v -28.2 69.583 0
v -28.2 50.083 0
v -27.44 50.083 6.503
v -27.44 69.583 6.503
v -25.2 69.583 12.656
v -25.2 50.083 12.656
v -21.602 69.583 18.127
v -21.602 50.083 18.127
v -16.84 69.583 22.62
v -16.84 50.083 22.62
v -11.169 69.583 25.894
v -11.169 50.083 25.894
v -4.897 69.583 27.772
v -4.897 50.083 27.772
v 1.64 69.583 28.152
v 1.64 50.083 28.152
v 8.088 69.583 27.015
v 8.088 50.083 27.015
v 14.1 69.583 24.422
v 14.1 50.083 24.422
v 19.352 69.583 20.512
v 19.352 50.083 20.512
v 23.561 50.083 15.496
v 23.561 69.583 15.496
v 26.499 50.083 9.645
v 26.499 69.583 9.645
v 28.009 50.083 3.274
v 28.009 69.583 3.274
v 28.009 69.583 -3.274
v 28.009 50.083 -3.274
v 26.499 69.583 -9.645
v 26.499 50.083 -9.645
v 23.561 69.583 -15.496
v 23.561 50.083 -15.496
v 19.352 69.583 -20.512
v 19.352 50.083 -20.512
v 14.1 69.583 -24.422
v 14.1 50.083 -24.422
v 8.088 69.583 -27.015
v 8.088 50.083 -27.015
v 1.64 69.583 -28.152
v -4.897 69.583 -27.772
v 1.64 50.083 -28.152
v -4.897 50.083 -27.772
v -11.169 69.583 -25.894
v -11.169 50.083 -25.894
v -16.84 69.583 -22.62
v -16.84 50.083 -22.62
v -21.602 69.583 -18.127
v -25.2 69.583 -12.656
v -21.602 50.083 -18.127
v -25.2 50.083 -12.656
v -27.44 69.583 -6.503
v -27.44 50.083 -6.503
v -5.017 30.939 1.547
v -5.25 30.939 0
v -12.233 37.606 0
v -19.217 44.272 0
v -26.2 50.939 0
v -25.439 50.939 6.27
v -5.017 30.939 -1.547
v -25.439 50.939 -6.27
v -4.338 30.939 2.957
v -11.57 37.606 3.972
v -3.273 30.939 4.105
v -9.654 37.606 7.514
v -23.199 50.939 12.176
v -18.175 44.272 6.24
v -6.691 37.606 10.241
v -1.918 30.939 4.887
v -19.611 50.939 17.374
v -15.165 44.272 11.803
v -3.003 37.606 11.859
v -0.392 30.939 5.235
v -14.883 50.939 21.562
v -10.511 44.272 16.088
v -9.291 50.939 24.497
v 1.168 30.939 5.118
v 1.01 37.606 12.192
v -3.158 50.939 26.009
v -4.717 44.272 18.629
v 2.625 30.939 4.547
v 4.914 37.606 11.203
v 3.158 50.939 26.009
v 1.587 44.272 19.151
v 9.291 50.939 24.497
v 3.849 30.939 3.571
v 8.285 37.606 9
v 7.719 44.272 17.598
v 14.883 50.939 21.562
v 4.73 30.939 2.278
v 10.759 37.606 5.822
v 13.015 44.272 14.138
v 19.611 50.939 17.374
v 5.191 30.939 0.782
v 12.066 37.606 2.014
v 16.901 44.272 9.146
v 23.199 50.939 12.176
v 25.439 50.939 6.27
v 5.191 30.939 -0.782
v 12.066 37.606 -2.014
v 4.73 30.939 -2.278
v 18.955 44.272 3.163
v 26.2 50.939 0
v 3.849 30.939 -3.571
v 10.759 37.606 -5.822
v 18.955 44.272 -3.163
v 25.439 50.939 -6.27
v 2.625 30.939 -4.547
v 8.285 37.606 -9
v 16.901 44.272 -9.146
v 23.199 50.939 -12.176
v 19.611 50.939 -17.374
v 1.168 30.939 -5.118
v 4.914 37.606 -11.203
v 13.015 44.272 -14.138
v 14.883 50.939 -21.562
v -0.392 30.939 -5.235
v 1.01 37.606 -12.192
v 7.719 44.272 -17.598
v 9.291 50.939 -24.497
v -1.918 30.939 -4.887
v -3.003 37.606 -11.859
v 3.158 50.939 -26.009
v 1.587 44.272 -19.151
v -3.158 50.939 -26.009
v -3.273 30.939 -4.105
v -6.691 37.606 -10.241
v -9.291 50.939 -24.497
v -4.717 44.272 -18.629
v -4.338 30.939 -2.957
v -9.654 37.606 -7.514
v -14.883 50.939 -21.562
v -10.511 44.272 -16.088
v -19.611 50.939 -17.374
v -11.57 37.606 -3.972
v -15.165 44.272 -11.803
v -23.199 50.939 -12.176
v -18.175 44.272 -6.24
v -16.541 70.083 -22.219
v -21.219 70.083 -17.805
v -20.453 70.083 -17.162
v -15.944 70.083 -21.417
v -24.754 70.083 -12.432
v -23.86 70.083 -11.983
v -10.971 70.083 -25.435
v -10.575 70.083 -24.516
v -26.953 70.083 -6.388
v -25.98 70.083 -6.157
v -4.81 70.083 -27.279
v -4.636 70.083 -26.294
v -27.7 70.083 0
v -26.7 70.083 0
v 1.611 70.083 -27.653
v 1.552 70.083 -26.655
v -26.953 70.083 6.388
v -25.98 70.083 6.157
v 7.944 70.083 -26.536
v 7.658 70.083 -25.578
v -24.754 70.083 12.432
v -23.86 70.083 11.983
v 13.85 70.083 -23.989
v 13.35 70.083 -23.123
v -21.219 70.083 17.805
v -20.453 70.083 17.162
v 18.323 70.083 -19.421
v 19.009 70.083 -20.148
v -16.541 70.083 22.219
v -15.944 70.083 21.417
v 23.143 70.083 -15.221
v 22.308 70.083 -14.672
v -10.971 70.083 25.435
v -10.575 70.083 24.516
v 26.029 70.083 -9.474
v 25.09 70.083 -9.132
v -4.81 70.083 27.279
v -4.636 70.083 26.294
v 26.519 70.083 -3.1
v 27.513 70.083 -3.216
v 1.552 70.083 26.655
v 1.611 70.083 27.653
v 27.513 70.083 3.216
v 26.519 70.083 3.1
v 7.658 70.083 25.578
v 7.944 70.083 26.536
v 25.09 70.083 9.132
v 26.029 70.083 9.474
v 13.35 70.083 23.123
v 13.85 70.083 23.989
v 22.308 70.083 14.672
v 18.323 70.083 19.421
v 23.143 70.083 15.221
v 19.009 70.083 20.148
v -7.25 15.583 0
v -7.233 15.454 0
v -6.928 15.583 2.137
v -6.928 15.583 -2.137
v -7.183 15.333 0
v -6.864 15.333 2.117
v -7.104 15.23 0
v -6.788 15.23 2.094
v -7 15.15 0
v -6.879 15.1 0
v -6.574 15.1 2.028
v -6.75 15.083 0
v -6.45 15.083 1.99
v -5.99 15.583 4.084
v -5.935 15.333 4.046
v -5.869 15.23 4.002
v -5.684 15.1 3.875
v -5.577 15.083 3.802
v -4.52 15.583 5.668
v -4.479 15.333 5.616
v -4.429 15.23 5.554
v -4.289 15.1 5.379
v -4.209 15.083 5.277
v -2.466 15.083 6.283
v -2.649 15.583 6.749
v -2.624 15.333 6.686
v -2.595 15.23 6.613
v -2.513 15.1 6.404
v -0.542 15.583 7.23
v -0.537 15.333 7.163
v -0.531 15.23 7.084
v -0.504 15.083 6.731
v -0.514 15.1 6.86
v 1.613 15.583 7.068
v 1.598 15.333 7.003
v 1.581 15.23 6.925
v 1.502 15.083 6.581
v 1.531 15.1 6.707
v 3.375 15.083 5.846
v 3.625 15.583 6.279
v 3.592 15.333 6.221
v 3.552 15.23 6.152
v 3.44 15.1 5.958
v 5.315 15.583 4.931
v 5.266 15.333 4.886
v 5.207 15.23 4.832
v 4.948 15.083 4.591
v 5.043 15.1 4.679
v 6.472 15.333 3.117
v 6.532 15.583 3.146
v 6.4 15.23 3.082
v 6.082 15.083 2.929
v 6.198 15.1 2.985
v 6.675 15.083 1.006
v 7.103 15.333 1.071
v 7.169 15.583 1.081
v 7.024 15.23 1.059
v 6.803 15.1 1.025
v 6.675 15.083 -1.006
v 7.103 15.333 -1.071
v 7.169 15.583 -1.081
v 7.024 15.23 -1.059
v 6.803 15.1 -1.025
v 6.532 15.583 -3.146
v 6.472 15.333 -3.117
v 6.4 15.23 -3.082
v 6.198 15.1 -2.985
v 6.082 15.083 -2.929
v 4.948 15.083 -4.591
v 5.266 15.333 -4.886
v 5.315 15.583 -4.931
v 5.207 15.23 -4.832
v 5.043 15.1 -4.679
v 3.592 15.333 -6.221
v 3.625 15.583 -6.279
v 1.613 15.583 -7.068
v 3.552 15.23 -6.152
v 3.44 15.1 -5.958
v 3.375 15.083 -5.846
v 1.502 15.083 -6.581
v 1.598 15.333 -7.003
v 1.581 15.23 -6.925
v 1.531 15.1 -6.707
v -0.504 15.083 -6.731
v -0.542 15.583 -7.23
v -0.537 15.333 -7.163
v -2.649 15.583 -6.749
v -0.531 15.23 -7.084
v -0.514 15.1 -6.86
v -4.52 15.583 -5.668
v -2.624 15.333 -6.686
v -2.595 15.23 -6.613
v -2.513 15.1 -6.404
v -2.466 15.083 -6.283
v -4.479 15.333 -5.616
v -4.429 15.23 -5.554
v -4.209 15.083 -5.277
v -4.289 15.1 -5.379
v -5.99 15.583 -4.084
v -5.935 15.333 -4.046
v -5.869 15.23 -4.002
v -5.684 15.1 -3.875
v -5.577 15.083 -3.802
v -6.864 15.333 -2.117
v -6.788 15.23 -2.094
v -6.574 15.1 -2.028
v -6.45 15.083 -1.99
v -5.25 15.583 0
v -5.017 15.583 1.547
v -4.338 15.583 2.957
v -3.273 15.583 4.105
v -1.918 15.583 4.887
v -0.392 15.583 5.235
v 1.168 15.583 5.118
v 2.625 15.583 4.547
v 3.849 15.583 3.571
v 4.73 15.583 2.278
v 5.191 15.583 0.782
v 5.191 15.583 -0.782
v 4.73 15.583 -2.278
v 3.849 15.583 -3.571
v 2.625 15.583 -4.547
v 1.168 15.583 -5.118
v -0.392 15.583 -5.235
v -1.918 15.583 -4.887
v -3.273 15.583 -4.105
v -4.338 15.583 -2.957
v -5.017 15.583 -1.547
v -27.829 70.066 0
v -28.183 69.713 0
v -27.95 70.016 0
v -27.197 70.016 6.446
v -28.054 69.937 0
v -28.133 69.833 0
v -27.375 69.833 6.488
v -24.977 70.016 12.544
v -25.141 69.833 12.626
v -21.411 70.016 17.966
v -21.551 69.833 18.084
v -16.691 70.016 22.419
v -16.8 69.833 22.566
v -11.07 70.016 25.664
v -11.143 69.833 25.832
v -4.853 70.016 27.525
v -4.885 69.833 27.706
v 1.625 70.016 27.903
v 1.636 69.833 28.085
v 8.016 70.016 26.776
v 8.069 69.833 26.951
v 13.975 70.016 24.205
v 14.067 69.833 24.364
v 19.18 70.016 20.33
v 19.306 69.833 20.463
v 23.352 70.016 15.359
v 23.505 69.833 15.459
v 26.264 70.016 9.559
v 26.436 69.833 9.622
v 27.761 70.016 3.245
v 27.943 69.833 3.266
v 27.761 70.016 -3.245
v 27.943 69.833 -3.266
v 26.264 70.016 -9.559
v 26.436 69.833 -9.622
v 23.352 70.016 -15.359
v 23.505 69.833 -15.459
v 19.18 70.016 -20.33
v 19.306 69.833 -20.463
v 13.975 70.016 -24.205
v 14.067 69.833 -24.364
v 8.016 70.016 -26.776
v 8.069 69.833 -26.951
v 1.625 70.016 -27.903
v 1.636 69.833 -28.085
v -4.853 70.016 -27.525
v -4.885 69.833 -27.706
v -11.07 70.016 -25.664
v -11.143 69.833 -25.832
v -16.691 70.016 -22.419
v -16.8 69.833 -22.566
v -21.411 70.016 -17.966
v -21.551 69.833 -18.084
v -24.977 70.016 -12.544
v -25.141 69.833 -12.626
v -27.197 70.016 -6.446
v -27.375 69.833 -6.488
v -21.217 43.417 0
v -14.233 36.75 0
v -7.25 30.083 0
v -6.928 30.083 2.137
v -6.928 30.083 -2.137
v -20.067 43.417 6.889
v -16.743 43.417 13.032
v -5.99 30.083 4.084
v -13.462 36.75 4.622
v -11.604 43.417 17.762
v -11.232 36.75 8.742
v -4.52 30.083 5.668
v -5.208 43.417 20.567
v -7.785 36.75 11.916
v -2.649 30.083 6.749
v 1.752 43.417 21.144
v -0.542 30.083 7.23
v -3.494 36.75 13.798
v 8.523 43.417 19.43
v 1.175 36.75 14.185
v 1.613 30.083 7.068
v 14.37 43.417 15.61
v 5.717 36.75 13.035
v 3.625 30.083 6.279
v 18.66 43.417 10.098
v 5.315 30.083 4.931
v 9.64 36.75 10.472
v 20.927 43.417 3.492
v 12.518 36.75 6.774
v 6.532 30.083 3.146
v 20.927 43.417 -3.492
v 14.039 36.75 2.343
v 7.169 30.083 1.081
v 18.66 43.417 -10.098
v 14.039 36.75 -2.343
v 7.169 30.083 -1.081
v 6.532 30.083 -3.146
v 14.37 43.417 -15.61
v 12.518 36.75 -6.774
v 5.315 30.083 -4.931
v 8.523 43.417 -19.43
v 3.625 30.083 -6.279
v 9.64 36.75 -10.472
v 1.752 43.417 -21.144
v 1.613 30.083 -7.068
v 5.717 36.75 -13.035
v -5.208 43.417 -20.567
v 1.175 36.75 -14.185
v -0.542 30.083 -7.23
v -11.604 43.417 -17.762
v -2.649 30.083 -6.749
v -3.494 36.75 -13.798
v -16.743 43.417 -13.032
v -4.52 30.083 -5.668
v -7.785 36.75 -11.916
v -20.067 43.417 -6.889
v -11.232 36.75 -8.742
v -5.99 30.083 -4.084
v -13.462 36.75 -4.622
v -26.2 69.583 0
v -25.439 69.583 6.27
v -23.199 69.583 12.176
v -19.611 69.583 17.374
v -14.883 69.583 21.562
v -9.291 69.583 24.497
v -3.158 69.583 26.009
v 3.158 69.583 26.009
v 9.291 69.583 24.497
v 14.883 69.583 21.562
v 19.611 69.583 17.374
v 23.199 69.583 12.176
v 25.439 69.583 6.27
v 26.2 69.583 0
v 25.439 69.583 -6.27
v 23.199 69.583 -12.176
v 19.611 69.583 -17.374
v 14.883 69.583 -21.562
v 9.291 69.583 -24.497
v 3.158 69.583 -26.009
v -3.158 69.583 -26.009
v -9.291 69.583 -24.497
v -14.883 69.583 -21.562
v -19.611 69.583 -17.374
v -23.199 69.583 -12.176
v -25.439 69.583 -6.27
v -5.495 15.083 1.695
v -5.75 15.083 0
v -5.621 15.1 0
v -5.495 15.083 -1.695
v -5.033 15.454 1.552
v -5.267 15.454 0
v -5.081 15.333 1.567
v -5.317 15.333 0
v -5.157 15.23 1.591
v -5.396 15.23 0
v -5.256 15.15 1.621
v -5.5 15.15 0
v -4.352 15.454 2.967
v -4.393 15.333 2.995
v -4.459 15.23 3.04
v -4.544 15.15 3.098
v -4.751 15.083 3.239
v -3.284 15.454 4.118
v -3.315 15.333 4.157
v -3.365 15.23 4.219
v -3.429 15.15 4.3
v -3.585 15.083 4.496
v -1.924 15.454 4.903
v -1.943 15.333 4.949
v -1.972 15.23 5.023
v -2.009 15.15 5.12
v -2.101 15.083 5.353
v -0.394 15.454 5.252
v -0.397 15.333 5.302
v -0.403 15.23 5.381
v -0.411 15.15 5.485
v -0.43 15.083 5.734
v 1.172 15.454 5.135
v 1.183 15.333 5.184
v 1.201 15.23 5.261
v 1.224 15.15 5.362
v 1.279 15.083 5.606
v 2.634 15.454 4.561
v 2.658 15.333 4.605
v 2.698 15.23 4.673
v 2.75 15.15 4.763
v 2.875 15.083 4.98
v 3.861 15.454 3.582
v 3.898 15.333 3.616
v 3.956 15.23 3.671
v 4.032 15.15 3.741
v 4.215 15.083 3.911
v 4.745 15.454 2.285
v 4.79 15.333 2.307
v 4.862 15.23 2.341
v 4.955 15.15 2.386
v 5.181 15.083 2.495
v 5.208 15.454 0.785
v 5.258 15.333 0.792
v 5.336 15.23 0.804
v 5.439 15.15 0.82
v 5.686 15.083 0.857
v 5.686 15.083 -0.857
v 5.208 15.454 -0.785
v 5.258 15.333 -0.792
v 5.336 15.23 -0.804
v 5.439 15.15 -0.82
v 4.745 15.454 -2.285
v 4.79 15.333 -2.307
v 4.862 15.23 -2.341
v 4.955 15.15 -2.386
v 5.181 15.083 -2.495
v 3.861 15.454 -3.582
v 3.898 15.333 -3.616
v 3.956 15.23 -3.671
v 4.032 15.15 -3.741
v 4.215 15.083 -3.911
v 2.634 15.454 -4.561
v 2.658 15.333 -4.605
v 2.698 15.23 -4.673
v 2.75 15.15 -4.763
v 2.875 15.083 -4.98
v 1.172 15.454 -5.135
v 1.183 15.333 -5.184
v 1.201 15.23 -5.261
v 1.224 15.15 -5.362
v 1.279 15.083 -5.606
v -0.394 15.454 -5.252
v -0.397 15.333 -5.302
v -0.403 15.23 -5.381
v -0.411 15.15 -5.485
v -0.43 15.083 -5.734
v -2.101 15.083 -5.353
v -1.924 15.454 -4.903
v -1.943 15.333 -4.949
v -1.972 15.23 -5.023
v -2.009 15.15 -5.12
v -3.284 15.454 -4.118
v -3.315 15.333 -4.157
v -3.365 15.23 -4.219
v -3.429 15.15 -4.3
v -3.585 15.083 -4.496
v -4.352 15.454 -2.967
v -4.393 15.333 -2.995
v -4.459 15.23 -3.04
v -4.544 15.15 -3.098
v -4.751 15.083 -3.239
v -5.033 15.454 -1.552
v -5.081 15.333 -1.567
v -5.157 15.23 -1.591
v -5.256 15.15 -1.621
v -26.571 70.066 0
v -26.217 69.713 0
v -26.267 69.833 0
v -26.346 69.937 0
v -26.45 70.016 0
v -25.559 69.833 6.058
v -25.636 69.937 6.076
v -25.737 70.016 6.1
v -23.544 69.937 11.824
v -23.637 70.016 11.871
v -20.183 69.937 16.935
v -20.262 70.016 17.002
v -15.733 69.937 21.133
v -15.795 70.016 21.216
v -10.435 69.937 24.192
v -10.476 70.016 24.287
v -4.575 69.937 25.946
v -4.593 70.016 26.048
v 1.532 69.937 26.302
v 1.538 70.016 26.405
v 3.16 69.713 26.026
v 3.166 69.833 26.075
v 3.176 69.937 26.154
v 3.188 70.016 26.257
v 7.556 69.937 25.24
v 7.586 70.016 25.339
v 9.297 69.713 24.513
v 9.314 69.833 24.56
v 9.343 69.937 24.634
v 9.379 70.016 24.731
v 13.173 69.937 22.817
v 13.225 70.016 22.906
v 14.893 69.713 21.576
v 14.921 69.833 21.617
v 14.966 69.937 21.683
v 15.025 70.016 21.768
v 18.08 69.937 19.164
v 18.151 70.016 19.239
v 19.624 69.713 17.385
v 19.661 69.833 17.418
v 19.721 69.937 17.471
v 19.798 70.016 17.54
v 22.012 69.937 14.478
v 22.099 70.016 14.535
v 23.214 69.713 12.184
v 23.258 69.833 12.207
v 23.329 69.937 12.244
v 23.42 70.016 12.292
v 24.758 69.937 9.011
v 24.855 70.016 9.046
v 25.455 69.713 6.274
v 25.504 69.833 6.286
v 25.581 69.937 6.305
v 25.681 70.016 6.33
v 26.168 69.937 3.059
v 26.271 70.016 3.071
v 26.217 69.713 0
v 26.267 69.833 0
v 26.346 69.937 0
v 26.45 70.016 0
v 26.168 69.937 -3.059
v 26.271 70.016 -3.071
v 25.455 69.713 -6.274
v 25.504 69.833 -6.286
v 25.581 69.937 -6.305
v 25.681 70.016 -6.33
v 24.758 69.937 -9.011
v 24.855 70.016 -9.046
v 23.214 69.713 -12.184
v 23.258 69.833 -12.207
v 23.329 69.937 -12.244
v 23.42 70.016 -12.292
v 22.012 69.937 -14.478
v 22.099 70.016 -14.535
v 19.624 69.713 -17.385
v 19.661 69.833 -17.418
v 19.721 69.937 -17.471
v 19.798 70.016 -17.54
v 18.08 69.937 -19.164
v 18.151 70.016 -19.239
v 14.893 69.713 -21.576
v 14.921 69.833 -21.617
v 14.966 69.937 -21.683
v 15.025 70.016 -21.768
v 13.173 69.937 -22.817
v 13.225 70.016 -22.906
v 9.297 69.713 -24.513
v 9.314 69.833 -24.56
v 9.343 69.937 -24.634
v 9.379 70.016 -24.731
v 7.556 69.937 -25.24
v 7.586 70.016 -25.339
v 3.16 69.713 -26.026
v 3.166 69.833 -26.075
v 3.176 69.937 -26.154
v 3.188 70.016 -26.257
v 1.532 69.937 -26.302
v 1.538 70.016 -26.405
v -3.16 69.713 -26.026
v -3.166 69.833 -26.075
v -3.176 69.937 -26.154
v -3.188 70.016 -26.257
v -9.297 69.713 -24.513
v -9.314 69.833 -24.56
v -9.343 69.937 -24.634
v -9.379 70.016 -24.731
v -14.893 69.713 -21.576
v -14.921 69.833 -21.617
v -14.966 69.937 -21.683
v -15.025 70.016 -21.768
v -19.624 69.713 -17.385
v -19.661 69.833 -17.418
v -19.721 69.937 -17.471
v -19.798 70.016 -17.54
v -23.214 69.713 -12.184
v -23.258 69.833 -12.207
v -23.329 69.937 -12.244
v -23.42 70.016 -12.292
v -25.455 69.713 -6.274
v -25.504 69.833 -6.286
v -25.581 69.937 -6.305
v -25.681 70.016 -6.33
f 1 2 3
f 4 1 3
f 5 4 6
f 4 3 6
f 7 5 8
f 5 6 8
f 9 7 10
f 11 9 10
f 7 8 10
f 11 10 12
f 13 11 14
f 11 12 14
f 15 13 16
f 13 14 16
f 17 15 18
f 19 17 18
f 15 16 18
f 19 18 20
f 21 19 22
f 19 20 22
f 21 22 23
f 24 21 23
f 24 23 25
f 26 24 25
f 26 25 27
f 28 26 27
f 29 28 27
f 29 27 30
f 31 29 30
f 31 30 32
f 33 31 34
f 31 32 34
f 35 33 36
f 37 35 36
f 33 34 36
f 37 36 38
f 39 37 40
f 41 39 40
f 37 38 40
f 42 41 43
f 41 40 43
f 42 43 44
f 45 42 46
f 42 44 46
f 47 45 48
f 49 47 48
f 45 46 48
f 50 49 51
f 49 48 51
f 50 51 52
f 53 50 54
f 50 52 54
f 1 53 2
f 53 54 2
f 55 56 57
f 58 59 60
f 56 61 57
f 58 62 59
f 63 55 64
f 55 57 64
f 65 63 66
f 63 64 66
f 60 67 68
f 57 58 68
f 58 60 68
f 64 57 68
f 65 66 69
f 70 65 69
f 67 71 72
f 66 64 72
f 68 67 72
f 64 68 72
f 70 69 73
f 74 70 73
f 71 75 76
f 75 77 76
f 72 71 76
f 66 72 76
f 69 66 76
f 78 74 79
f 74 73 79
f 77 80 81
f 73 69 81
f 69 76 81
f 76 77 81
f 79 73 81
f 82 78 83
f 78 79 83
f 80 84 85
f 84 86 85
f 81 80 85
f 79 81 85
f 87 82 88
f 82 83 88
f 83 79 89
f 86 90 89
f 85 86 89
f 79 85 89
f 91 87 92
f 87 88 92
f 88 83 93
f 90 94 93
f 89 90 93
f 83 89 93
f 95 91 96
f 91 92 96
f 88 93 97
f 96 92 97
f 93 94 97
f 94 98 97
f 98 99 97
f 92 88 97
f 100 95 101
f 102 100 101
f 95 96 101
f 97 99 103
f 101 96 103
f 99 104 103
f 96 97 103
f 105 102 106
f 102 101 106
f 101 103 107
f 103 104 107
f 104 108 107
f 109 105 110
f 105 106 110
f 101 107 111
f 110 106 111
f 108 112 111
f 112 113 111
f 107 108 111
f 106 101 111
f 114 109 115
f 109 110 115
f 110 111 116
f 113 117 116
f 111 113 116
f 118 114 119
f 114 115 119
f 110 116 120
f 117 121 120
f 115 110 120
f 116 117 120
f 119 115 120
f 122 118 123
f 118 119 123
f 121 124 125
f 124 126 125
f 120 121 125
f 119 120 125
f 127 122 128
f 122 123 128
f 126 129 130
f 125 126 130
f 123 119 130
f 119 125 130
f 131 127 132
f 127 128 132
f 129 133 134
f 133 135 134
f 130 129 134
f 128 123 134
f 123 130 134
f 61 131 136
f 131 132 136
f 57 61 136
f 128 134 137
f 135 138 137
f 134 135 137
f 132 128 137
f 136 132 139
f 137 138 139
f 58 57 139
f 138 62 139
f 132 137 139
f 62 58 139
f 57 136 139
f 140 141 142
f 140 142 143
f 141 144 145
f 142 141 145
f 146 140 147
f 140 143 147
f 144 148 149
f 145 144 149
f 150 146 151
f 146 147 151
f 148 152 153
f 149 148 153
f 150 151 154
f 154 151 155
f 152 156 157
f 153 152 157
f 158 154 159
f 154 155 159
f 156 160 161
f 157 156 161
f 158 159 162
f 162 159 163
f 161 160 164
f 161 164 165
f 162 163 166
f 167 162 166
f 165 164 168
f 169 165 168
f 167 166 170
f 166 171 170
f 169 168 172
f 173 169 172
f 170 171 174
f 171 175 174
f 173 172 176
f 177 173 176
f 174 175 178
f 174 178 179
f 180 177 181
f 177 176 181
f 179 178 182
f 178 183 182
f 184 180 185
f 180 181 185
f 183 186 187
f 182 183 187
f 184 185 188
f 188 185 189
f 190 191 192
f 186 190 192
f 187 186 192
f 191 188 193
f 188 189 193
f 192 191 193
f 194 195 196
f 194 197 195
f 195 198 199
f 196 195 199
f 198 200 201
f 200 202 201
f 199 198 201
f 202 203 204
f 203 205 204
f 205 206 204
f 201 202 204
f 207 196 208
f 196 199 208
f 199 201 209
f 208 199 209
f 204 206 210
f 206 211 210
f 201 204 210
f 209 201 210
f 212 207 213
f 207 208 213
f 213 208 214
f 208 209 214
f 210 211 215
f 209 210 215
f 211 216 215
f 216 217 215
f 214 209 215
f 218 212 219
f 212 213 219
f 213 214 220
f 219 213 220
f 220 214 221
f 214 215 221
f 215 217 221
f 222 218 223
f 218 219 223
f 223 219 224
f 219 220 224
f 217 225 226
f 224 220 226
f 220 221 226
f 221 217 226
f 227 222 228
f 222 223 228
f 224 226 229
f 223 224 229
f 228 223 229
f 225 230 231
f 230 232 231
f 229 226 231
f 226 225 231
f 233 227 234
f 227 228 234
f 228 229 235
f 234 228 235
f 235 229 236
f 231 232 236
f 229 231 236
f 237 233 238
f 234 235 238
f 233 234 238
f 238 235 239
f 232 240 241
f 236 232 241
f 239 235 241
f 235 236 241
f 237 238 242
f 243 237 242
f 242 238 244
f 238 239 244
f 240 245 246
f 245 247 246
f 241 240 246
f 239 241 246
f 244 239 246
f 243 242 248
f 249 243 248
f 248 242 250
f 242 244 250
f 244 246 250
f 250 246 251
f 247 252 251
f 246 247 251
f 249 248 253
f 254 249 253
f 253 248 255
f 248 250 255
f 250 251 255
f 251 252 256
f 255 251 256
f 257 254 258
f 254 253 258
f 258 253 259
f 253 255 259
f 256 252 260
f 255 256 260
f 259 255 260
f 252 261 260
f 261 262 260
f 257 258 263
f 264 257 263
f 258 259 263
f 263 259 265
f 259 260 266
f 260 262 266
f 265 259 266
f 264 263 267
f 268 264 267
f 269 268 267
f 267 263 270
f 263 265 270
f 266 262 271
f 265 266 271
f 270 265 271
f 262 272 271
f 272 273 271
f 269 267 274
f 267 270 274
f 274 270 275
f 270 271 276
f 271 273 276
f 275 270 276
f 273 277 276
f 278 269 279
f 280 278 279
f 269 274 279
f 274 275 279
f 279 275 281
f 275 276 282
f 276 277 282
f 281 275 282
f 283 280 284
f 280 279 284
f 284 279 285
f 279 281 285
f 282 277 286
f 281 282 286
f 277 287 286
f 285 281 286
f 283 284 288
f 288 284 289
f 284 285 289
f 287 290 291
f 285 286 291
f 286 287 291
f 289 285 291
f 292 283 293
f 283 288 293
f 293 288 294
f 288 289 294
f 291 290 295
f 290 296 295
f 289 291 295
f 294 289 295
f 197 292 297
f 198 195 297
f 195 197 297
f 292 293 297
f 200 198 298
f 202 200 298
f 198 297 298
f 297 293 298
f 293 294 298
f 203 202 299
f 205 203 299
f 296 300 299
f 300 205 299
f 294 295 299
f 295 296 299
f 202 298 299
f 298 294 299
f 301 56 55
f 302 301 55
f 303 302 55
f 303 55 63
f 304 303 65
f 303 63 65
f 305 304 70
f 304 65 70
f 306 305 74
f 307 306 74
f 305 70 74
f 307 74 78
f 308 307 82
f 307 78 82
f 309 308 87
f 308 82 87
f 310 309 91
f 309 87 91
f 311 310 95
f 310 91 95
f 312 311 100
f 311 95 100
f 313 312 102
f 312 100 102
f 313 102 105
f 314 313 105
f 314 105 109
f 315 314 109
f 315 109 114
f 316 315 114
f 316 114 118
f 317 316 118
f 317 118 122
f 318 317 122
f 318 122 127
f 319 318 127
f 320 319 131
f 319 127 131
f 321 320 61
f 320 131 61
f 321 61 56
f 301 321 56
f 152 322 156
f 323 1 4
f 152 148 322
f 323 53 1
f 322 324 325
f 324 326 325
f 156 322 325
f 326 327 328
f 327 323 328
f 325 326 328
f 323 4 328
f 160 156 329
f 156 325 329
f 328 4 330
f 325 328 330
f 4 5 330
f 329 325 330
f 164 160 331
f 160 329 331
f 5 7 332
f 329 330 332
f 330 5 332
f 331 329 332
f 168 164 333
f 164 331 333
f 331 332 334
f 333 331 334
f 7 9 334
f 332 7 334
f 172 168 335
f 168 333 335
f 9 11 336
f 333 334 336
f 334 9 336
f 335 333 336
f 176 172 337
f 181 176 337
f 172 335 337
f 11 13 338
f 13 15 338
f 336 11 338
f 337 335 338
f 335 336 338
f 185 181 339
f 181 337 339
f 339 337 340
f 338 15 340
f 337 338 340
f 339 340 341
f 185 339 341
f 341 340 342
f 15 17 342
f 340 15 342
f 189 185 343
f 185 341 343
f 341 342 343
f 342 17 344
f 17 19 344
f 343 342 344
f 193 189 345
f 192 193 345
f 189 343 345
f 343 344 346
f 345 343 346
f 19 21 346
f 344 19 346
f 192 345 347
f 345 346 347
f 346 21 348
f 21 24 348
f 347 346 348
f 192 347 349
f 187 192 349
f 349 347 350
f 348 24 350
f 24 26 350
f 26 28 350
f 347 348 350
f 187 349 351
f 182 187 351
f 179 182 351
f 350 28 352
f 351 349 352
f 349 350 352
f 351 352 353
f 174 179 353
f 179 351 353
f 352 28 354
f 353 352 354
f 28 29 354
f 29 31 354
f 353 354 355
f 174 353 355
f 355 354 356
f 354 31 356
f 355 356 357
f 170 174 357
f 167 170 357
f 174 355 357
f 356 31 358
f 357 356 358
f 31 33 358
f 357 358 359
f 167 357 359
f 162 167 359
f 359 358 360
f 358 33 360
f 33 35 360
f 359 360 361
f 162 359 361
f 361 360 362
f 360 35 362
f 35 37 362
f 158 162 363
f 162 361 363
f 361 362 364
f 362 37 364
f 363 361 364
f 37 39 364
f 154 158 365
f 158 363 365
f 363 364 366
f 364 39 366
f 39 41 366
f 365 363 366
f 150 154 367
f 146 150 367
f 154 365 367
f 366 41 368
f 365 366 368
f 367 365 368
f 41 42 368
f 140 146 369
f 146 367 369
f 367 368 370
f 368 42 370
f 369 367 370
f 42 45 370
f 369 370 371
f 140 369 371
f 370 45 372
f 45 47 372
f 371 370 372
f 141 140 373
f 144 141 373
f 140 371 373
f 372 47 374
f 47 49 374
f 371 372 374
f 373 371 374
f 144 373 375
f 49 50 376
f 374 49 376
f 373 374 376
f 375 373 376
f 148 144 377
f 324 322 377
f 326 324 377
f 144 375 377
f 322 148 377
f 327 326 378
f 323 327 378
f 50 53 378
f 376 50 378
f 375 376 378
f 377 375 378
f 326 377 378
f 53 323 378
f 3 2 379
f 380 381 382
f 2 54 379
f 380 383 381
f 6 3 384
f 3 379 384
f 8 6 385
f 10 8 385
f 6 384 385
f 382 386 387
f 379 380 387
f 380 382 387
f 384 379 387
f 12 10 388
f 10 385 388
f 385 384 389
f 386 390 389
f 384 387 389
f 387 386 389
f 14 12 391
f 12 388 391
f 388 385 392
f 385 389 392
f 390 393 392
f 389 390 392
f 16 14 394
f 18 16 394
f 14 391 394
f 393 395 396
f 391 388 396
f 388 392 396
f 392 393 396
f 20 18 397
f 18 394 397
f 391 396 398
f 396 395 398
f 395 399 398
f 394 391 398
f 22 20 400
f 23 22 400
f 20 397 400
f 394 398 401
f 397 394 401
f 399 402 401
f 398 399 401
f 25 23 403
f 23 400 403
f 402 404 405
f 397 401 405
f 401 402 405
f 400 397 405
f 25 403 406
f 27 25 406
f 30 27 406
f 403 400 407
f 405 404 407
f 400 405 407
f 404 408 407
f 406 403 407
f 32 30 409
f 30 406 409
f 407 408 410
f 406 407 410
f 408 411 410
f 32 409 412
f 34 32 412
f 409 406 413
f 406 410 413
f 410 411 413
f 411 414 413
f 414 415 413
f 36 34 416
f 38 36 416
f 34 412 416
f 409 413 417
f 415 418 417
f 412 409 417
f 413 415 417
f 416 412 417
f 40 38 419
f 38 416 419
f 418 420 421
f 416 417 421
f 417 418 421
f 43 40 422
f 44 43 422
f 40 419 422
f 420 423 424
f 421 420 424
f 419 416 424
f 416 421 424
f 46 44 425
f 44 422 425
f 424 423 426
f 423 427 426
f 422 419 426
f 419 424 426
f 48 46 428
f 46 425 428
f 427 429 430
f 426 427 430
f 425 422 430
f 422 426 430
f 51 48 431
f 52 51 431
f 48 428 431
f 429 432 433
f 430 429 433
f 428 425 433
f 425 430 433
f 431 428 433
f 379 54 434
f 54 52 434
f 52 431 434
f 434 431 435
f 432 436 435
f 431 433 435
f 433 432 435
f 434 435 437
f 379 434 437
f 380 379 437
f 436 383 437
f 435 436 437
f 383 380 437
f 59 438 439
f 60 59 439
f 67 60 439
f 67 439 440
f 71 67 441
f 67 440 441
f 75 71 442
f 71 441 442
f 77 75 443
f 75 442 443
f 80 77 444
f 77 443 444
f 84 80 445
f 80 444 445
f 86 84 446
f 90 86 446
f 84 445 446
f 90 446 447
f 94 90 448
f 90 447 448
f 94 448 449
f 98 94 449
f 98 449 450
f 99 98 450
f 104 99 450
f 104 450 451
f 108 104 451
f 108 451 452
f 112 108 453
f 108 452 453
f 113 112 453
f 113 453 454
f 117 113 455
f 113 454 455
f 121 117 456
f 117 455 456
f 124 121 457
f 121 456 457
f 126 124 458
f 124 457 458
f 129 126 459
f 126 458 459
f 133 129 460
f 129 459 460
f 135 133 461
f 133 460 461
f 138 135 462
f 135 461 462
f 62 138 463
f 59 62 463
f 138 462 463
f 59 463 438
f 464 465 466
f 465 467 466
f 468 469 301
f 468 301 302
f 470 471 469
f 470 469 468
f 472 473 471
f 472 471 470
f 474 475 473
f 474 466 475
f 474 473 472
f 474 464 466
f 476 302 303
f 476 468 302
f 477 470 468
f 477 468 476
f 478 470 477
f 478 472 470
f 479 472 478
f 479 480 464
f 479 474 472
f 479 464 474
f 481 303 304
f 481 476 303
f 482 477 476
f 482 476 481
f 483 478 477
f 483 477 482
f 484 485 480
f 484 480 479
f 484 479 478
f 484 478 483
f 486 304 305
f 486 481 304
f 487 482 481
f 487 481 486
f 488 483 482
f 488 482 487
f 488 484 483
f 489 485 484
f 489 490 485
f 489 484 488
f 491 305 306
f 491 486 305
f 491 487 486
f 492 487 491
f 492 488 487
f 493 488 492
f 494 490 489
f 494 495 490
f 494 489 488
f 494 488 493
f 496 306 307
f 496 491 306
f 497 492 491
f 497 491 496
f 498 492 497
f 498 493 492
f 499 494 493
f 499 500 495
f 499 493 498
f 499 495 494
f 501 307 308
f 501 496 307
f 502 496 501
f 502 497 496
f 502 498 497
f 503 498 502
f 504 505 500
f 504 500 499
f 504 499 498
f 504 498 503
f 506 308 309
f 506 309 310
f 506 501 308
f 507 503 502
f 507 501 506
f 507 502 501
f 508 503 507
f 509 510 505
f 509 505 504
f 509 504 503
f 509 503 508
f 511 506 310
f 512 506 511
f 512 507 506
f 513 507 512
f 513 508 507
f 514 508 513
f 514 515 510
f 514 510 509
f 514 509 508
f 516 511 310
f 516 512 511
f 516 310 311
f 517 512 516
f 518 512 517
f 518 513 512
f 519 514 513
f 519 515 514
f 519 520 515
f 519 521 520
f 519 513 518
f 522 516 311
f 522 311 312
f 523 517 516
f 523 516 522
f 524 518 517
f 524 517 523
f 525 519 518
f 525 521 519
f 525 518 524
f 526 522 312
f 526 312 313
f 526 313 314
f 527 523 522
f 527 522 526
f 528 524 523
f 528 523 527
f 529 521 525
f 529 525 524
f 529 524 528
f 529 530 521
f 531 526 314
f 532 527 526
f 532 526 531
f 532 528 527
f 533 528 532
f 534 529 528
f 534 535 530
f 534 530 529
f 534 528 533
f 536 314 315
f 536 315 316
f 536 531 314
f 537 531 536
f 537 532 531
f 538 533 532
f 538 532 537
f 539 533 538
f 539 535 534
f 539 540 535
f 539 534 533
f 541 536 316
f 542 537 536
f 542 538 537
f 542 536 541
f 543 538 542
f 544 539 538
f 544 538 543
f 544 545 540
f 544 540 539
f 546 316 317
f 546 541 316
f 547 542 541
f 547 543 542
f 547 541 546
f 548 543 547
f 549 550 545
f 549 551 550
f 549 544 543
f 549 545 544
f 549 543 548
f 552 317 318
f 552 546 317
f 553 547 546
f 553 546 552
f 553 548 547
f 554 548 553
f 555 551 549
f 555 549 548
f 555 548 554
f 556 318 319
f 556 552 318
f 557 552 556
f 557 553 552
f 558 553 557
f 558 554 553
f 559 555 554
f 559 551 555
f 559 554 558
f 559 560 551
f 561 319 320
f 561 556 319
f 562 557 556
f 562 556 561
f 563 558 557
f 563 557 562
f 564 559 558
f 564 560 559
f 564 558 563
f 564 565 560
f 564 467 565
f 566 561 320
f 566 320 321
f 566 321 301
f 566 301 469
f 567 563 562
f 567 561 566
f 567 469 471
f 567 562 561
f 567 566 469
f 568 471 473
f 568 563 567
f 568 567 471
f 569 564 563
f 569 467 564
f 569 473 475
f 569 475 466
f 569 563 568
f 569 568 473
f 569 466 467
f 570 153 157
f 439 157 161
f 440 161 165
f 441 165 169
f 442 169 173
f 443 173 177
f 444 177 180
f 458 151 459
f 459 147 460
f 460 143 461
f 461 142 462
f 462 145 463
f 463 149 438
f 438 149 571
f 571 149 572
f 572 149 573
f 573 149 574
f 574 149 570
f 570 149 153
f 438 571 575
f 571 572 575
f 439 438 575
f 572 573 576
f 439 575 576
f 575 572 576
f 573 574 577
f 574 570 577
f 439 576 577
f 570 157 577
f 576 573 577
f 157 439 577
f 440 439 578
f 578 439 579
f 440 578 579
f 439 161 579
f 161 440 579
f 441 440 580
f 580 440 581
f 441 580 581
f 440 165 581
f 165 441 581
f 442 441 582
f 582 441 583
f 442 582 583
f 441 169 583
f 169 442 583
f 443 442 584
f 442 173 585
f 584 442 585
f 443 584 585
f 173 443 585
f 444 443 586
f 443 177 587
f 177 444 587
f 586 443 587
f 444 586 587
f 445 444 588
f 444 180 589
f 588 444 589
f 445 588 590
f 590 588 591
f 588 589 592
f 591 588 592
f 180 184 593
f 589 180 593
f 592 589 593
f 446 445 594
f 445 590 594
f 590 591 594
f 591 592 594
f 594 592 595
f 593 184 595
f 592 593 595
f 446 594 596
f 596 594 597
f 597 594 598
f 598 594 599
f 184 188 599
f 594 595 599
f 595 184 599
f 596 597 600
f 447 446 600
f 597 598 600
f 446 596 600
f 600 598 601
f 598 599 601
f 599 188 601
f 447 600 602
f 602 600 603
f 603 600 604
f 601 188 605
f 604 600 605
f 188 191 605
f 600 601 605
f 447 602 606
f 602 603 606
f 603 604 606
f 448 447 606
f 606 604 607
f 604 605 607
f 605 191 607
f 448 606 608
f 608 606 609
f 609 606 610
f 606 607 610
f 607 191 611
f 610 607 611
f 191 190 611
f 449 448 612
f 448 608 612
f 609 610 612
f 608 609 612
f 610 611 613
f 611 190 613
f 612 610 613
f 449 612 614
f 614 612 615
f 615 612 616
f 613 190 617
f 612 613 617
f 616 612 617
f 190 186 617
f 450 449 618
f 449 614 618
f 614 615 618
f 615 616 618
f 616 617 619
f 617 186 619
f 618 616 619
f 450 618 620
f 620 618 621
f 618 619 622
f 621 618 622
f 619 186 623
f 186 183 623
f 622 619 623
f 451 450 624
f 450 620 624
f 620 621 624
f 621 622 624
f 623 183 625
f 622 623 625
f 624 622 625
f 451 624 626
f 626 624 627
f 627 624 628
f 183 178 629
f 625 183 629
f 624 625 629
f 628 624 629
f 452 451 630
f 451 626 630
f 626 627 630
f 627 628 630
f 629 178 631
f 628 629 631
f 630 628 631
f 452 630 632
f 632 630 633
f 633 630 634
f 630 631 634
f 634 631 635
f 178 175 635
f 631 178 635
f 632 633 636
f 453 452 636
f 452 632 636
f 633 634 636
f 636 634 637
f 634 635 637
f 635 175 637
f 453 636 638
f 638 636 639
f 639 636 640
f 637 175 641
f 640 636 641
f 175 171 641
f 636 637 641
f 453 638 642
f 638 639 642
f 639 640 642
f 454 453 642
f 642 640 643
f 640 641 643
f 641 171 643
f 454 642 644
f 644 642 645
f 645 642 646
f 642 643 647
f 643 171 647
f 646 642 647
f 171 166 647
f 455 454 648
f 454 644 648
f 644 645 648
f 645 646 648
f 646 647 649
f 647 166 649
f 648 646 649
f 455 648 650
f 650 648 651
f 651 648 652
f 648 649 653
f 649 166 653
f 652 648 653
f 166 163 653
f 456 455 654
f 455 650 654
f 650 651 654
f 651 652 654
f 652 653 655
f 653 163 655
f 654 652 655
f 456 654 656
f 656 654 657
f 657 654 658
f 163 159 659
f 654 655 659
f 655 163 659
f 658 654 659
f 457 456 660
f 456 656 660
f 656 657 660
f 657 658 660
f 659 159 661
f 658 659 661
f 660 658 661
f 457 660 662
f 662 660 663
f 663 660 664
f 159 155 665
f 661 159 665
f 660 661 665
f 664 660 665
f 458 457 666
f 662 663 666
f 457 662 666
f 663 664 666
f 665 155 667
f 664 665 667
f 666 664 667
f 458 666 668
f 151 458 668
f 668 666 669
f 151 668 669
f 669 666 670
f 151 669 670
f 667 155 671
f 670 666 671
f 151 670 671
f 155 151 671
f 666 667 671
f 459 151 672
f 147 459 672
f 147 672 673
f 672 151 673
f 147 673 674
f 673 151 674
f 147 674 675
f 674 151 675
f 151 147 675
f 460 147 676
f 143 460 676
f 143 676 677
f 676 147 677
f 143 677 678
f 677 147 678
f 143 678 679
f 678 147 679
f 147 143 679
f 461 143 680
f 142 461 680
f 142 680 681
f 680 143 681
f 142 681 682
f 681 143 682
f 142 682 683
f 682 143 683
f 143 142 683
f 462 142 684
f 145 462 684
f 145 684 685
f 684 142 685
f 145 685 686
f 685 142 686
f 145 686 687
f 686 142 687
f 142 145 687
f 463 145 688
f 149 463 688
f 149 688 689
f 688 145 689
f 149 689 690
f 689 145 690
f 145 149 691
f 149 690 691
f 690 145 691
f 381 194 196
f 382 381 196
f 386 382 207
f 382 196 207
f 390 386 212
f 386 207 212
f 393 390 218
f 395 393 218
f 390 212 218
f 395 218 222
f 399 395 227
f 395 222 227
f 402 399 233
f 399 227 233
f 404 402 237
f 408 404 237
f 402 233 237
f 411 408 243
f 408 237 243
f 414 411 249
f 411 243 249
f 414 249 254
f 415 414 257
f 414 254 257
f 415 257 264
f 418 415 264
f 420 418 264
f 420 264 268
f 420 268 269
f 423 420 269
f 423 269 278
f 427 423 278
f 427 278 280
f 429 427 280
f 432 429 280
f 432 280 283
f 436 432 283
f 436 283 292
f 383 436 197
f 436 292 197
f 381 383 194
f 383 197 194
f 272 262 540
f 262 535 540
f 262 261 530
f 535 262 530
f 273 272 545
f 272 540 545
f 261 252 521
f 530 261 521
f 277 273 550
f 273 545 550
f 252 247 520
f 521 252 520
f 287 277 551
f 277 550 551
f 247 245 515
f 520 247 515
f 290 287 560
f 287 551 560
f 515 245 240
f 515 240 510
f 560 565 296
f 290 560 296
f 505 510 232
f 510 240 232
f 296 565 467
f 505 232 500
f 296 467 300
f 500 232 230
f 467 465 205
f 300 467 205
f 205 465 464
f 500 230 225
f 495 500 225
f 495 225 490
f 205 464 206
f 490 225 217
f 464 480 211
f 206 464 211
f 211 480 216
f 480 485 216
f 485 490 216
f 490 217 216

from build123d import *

# Parameters (mm, degrees)
FILLET1_R = 0.5


with BuildPart() as part:
    # Sketch1 → Revolve1 (revolve)
    with BuildSketch(Plane.XY):
        Polygon((-5.25, 15.08330694), (-5.25, 30.939040938), (-26.2, 50.939040938), (-26.2, 70.08330694), (-28.2, 70.08330694), (-28.2, 50.08330694), (-7.25, 30.08330694), (-7.25, 15.08330694), align=None)
    revolve(axis=Axis((0, 0, 0), (0, 1, 0)))

    # Fillet1
    fillet1_edges = [part.edges().sort_by_distance(p)[0] for p in [
        (7.25, 15.08330694, 0),
        (28.2, 70.08330694, 0),
        (26.2, 70.08330694, 0),
        (5.25, 15.08330694, 0),
    ]]
    fillet(fillet1_edges, radius=FILLET1_R)


solid = part.part
